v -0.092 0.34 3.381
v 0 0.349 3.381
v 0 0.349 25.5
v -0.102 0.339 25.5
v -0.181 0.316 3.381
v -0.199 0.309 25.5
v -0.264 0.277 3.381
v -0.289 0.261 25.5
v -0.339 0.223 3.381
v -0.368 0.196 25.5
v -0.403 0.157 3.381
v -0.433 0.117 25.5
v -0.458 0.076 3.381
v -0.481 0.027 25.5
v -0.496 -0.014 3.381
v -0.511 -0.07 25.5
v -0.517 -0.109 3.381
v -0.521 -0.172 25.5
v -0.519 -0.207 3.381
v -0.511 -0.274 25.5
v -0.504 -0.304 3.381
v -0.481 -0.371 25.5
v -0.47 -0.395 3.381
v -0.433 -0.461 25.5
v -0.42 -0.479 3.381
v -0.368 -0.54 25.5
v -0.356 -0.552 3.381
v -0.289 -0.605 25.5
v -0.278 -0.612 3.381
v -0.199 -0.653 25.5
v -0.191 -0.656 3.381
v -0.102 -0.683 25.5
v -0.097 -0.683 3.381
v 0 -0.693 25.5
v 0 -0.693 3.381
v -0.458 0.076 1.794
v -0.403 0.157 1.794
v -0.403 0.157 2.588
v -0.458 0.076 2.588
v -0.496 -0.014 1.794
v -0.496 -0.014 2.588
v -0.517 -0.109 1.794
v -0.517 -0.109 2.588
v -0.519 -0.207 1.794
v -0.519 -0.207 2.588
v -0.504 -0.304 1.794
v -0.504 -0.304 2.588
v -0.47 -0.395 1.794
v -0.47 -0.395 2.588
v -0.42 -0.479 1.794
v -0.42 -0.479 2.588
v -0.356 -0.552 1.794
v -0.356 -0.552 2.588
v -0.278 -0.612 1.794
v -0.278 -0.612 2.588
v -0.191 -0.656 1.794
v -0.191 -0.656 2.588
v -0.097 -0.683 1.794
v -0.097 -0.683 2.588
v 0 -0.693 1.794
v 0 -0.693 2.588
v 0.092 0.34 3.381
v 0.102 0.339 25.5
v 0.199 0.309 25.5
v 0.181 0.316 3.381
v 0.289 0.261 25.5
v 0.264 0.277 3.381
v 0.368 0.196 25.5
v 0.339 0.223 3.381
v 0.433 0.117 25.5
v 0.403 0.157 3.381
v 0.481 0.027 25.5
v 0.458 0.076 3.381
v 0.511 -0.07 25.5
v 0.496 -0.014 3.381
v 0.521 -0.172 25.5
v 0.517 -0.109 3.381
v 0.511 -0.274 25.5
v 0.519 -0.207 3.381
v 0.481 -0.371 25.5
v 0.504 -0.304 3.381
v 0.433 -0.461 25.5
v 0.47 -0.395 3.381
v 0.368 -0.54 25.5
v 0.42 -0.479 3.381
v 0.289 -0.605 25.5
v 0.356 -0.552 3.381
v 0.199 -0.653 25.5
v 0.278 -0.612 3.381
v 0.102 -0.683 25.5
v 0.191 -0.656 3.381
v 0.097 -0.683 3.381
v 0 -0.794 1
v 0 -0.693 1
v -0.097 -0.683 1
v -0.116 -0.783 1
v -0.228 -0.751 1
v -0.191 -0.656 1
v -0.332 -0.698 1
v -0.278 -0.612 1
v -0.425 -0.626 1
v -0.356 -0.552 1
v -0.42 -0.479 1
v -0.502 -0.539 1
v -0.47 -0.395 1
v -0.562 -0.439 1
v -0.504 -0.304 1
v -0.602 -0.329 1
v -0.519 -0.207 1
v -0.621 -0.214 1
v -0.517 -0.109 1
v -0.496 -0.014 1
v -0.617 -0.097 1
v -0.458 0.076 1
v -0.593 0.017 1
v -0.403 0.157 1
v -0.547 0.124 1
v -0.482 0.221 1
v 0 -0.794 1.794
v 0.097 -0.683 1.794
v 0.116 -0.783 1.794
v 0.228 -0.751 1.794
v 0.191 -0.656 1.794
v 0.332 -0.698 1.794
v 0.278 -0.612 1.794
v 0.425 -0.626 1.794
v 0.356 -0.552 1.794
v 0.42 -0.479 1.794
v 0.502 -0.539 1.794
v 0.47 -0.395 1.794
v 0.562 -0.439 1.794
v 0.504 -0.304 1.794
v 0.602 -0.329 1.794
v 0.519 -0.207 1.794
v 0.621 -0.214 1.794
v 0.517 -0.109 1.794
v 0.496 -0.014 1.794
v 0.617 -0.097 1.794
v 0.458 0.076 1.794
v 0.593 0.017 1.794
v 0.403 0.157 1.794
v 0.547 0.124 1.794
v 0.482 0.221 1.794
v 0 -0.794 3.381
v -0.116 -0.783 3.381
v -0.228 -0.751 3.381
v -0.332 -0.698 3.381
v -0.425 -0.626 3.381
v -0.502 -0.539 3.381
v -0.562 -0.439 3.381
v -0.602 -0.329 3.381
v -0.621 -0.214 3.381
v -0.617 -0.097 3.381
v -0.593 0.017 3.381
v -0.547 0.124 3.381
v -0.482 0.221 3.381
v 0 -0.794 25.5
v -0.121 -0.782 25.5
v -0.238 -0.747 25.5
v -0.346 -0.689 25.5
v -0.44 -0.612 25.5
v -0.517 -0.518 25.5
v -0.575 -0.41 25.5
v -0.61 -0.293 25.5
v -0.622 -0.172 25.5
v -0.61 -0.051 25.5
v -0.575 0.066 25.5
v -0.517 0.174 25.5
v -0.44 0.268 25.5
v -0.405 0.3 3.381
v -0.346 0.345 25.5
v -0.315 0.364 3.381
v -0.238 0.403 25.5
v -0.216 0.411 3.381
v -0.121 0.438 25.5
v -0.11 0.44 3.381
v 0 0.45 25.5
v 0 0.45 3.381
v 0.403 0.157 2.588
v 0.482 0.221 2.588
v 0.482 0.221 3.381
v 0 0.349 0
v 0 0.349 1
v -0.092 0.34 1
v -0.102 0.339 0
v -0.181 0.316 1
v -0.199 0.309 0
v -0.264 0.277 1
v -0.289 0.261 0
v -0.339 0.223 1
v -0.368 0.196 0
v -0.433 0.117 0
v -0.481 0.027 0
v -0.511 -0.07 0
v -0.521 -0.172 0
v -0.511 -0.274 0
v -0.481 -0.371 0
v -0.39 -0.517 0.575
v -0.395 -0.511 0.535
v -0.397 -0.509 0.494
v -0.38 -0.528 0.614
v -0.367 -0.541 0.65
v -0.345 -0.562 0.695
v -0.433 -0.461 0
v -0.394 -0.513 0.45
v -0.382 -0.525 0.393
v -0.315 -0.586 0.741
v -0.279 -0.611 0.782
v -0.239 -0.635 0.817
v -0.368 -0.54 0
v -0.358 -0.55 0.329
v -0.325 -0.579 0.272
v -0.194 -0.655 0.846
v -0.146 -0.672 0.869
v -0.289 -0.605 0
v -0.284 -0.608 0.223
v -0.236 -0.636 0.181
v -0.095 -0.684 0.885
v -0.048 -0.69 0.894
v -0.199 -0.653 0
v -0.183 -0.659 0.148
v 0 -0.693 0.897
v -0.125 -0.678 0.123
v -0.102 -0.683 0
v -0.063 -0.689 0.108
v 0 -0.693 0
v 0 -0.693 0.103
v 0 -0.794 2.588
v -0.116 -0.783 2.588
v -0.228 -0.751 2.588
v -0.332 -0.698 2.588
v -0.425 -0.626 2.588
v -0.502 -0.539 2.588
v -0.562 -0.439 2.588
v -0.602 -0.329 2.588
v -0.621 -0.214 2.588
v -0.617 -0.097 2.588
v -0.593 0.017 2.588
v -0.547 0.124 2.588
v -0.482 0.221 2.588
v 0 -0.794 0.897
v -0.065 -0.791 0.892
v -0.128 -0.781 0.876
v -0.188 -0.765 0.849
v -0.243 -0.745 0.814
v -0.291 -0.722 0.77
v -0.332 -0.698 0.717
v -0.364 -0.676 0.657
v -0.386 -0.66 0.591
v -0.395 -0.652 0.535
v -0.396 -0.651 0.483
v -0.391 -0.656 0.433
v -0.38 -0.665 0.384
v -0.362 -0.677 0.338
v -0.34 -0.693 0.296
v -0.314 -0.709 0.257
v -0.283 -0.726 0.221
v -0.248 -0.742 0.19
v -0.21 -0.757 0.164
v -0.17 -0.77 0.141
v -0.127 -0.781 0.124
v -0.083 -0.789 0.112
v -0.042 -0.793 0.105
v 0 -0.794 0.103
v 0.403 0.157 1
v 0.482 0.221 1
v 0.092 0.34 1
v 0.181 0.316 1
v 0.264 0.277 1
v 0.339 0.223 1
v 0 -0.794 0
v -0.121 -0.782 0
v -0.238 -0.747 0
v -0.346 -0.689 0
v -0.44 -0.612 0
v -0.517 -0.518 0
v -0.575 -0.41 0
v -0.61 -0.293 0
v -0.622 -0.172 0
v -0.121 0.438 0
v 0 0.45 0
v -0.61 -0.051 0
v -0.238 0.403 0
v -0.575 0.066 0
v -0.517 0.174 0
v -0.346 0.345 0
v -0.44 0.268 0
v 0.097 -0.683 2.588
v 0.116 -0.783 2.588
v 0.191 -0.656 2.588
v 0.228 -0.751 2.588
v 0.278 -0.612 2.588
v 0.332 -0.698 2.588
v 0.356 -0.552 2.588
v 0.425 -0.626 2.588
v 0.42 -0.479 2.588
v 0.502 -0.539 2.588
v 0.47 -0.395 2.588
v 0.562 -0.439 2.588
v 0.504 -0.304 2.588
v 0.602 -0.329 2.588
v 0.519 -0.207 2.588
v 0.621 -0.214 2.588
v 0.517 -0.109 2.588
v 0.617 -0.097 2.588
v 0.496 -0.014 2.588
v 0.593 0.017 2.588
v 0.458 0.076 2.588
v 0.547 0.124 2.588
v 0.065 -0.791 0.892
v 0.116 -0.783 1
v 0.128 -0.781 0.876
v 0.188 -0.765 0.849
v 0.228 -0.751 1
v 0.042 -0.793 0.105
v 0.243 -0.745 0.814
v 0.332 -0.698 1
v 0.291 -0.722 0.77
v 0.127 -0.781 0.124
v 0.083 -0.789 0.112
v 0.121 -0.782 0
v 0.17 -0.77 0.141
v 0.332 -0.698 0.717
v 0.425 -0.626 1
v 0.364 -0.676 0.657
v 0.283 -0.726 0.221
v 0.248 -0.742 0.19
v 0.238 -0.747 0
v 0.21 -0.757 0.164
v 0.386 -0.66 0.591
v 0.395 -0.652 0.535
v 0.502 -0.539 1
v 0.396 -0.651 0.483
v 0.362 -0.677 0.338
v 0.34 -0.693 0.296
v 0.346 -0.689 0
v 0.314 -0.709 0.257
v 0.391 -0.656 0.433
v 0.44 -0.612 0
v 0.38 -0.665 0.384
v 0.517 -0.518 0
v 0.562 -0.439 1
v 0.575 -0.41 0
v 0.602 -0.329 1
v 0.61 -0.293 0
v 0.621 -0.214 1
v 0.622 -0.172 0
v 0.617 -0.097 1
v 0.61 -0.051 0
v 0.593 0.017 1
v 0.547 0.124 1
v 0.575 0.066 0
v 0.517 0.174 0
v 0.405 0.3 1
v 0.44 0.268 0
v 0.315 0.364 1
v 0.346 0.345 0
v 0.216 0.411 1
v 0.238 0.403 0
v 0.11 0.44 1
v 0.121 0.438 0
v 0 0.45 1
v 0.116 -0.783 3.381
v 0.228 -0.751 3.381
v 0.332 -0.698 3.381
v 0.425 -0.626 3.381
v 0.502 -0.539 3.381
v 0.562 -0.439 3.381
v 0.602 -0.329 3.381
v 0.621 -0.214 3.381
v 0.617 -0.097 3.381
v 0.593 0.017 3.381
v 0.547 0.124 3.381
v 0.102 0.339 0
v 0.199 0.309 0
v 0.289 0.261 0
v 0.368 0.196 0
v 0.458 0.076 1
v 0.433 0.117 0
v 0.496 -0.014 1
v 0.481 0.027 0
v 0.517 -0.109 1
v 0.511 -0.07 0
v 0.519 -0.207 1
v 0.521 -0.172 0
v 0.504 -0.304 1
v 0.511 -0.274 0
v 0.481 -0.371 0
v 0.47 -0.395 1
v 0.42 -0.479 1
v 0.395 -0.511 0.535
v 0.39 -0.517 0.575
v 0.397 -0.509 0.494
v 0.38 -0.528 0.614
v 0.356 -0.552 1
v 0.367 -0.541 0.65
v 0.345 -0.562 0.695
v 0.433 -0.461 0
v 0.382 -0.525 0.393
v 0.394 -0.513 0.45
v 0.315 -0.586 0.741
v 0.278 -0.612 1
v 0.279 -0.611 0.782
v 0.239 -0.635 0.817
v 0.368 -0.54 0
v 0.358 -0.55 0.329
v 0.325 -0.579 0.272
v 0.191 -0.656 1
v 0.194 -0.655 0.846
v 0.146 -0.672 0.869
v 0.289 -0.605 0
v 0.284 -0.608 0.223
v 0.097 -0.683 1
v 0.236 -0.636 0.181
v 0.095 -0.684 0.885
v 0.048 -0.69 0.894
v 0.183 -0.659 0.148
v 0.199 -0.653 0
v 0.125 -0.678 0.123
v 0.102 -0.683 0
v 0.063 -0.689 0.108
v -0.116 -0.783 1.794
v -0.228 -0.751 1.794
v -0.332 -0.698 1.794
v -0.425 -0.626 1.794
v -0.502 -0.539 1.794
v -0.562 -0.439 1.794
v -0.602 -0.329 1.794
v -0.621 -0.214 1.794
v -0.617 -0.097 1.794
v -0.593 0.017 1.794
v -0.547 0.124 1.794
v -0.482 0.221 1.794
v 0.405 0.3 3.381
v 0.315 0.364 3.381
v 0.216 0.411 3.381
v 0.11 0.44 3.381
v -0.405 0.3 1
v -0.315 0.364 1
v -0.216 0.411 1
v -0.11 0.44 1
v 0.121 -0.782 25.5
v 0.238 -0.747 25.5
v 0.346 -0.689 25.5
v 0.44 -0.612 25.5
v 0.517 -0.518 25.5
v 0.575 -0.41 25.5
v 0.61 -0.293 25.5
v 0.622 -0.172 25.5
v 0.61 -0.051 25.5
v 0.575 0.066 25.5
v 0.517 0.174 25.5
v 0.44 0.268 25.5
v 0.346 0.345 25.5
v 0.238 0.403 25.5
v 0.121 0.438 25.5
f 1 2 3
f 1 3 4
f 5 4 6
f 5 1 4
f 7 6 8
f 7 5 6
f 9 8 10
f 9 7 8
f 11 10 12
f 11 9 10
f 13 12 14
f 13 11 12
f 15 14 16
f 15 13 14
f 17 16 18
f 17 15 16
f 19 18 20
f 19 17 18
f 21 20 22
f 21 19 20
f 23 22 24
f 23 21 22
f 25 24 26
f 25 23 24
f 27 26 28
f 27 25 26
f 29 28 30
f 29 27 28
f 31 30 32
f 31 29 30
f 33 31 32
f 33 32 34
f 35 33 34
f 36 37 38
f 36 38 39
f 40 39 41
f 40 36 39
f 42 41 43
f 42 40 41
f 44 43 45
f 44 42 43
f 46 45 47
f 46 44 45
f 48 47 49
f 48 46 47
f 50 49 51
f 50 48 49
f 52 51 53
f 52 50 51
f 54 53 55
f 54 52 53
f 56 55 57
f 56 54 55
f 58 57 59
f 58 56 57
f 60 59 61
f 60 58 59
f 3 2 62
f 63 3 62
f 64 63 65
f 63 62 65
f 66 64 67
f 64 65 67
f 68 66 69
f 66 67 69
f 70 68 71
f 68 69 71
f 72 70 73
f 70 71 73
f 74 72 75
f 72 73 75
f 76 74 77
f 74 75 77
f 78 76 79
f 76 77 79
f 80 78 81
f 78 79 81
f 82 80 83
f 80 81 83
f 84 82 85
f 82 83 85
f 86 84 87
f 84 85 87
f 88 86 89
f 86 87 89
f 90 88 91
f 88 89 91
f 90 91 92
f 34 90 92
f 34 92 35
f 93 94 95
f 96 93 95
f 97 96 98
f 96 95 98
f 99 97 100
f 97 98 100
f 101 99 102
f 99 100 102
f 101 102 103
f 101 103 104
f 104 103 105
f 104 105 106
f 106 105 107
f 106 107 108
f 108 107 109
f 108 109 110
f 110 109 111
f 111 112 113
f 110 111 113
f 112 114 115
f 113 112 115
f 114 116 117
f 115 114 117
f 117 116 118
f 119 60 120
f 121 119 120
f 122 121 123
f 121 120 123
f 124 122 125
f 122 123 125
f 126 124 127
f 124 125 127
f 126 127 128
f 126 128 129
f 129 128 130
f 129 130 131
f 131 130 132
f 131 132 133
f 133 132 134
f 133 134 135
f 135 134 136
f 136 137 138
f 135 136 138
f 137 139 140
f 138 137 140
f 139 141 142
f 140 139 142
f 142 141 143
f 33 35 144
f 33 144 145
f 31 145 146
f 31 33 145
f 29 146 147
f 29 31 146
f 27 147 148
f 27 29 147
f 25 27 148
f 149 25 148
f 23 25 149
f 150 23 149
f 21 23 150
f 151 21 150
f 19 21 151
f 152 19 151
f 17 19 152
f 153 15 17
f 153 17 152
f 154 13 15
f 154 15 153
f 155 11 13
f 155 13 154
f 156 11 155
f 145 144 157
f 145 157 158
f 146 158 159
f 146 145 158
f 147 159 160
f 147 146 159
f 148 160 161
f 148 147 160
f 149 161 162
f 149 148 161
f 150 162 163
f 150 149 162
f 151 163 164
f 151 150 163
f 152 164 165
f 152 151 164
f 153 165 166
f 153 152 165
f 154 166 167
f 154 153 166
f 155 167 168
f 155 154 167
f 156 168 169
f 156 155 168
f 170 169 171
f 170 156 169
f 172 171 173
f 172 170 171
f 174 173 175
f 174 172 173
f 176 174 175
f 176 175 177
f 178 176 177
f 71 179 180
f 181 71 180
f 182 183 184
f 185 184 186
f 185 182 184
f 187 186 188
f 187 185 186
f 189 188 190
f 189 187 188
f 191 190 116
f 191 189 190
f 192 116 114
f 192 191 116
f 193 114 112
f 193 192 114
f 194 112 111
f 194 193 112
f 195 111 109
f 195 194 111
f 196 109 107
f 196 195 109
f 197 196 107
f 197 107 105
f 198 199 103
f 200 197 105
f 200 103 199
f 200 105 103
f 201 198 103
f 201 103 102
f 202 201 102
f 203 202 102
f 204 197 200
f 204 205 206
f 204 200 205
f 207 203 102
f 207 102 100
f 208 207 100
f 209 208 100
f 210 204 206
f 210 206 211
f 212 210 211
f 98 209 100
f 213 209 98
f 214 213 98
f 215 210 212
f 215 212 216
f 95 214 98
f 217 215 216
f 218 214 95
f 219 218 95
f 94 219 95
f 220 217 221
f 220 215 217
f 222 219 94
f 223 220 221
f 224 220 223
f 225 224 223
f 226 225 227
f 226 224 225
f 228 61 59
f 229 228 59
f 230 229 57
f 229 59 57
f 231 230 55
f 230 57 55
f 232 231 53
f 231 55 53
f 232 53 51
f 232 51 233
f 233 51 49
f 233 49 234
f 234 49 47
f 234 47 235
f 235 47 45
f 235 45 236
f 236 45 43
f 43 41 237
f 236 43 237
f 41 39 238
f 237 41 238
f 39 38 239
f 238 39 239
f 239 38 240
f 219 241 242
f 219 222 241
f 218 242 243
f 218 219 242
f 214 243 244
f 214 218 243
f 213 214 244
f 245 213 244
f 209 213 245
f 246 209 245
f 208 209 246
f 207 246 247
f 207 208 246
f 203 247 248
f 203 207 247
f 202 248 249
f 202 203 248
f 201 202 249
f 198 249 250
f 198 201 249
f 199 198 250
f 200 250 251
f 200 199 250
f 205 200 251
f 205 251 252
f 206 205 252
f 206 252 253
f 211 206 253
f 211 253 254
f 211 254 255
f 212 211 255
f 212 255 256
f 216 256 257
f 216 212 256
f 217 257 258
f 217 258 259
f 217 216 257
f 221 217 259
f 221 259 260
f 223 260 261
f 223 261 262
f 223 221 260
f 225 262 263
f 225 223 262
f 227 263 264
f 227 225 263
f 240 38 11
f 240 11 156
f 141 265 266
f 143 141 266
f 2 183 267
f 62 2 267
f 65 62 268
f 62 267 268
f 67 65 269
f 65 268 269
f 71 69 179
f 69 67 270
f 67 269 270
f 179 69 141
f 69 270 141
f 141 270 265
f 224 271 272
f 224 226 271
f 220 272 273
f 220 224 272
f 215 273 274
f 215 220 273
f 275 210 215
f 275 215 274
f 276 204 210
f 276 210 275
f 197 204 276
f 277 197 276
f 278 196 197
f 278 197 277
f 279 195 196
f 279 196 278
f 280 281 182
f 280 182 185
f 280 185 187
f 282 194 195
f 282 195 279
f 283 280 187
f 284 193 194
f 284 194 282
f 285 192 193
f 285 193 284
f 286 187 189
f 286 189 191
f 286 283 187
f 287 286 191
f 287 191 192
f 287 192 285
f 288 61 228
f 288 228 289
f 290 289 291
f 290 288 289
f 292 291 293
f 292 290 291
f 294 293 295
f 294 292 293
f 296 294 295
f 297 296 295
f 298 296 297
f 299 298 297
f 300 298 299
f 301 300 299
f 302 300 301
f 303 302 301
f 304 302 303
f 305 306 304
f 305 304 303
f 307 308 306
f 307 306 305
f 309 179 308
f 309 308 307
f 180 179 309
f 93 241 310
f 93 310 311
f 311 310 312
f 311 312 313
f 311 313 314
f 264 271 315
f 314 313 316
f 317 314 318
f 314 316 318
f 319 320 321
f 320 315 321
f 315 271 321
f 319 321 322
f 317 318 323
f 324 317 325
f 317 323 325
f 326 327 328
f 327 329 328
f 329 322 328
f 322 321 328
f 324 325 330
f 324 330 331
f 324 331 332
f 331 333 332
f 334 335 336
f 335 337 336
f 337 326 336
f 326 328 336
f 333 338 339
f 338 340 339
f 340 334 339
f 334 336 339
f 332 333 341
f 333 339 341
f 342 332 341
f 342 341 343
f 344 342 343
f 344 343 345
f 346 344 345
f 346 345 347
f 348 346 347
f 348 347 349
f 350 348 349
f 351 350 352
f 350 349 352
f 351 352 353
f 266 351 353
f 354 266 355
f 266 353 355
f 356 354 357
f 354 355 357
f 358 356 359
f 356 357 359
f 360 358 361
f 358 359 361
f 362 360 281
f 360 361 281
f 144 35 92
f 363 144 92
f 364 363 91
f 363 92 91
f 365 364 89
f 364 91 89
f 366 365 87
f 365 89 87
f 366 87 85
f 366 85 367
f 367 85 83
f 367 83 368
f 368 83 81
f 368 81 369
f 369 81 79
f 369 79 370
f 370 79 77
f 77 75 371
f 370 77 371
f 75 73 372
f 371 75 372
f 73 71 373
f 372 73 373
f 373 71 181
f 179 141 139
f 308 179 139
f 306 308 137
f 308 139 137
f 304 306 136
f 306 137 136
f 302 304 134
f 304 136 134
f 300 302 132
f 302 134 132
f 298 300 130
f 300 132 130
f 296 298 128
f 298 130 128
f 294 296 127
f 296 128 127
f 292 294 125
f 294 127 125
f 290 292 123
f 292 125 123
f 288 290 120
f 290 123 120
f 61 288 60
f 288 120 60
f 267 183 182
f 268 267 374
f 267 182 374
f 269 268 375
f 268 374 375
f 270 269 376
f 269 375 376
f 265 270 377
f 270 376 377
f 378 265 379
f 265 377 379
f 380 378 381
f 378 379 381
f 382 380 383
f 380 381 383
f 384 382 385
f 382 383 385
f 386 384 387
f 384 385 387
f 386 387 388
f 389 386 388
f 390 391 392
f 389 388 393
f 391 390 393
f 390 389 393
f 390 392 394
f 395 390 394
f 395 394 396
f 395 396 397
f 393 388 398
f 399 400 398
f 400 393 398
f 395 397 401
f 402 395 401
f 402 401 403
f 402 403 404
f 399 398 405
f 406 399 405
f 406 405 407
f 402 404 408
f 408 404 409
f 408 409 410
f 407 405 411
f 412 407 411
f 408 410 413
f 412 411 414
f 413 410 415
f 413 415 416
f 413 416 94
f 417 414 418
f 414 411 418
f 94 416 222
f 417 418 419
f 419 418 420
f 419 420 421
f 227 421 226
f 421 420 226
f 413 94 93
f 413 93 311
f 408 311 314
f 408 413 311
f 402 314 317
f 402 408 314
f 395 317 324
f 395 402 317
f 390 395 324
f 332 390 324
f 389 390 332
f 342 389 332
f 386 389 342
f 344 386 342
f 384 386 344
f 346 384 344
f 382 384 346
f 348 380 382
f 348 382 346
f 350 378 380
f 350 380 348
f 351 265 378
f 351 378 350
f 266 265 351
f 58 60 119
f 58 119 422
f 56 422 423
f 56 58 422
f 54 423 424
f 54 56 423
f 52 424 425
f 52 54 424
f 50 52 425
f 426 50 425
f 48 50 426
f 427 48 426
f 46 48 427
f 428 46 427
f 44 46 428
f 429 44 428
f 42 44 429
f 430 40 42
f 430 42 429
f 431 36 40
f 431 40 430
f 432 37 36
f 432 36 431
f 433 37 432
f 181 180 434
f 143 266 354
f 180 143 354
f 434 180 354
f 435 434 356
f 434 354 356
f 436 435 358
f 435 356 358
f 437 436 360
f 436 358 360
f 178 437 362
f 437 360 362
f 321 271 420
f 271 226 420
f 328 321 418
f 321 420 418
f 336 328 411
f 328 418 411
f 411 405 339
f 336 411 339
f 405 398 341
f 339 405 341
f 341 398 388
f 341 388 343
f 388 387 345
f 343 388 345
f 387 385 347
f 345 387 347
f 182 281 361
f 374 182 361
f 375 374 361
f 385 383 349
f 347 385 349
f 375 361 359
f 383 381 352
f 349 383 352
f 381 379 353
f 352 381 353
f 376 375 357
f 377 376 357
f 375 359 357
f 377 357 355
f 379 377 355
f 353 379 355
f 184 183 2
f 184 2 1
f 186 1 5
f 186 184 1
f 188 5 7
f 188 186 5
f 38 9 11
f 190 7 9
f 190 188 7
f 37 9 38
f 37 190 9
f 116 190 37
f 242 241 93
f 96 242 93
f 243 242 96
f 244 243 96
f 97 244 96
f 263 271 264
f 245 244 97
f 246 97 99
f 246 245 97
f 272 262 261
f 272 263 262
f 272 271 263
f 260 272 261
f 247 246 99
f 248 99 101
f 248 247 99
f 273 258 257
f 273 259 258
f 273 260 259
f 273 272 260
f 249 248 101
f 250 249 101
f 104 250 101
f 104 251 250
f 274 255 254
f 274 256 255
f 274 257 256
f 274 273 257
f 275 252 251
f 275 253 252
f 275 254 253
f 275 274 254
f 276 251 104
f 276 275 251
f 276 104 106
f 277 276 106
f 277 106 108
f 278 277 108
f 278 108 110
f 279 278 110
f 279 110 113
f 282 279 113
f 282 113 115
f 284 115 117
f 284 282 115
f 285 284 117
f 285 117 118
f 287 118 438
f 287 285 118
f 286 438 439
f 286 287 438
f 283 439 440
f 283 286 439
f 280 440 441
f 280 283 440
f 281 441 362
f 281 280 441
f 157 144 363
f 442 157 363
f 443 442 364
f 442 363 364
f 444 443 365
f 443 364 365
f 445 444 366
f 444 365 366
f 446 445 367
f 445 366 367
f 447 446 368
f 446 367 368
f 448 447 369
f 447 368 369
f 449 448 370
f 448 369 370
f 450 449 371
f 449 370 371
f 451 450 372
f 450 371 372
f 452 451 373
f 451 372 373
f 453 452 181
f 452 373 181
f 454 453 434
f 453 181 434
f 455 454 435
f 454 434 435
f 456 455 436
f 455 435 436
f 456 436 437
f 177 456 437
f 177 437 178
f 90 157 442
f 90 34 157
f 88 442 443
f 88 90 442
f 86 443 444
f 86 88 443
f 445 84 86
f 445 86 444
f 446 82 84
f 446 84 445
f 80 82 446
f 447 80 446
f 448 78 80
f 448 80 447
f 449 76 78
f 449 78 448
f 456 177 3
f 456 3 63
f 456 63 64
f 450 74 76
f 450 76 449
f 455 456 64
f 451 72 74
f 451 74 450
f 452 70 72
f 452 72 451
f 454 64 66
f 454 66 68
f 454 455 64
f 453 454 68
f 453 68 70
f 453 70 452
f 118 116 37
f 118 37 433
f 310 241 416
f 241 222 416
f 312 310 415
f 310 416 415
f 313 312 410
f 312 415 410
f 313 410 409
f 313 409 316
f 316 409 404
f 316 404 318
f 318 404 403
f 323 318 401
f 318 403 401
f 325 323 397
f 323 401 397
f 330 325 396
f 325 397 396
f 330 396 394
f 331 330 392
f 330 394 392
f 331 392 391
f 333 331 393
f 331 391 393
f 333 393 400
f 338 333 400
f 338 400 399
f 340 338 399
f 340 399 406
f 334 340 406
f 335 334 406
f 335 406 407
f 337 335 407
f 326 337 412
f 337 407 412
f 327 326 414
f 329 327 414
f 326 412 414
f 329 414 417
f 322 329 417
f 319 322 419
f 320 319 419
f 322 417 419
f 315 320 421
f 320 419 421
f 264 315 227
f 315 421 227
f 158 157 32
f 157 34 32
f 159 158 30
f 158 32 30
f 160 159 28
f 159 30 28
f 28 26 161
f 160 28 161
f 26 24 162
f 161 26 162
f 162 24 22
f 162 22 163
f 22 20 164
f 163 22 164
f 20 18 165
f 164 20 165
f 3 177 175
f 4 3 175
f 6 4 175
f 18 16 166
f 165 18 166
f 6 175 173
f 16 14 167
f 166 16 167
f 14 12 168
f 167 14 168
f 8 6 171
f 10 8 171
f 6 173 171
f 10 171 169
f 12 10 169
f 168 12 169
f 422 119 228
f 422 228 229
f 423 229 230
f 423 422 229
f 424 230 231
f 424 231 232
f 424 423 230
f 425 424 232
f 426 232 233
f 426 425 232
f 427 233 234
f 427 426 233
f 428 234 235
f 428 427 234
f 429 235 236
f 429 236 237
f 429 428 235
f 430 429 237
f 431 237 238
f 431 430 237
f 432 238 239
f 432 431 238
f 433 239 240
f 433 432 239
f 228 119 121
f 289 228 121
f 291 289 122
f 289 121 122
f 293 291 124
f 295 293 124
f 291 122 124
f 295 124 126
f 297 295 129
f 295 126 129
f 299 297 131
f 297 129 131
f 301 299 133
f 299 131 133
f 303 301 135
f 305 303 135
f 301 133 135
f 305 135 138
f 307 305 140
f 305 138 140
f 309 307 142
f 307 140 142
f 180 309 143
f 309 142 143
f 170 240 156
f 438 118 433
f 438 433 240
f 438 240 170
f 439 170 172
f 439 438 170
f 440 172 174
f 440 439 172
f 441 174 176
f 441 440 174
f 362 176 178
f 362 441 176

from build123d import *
from build123d.topology import SkipClean

# Parameters (mm, degrees)
THICKEN1_START     = 3.38125
THICKEN1_DEPTH     = 22.11875
THICKEN1_2_DEPTH   = 1
THICKEN1_START_2   = 1.79375
THICKEN1_3_DEPTH   = 0.79375
THICKEN1_START_3   = 1
THICKEN1_4_DEPTH   = 2.38125
SKETCH7_R          = 0.396875
CUT_EXTRUDE1_DEPTH = 10


with BuildPart() as part:
    # Thicken1: read off the stored shape, not the designer's step
    # Thicken1 outline → Thicken1 (new body)
    with BuildSketch(Plane.XY.offset(THICKEN1_START)):
        with BuildLine():
            ThreePointArc((0, -0.794033341), (0.622, -0.172033341), (0, 0.449966659))
            Line((0, 0.449966659), (0, 0.348580659))
            ThreePointArc((0, 0.348580659), (0.520614, -0.172033341), (0, -0.692647341))
            Line((0, -0.692647341), (0, -0.794033341))
        make_face()
    extrude(amount=THICKEN1_DEPTH)



with BuildPart() as body_2:
    # Thicken1 2 outline → Thicken1 2 (new body)
    with BuildSketch(Plane.XY):
        with BuildLine():
            ThreePointArc((0, -0.794033341), (0.622, -0.172033341), (0, 0.449966659))
            Line((0, 0.449966659), (0, 0.348580659))
            ThreePointArc((0, 0.348580659), (0.520614, -0.172033341), (0, -0.692647341))
            Line((0, -0.692647341), (0, -0.794033341))
        make_face()
    extrude(amount=THICKEN1_2_DEPTH)


with BuildPart() as body_3:
    # Thicken1 3 outline → Thicken1 3 (new body)
    with BuildSketch(Plane.XY.offset(THICKEN1_START_2)):
        with BuildLine():
            ThreePointArc((0, -0.794033341), (0.622, -0.172033341), (0, 0.449966659))
            Line((0, 0.449966659), (0, 0.348580659))
            ThreePointArc((0, 0.348580659), (0.520614, -0.172033341), (0, -0.692647341))
            Line((0, -0.692647341), (0, -0.794033341))
        make_face()
    extrude(amount=THICKEN1_3_DEPTH)


with BuildPart() as part_1:
    add(part.part)

    add(body_2.part)  # Thicken1 4 merges body 2

    add(body_3.part)  # Thicken1 4 merges body 3
    # Thicken1 4 outline → Thicken1 4 (add)
    with BuildSketch(Plane.XY.offset(THICKEN1_START_3)):
        with BuildLine():
            Line((0.40339385, 0.157075059), (0.481952031, 0.221166659))
            ThreePointArc((0.481952031, 0.221166659), (0.26675232, 0.389862735), (0, 0.449966659))
            Line((0, 0.449966659), (0, 0.348580659))
            ThreePointArc((0, 0.348580659), (0.223271692, 0.298273674), (0.40339385, 0.157075059))
        make_face()
    extrude(amount=THICKEN1_4_DEPTH)

    # Sketch7 → Cut-Extrude1 (cut)
    with BuildSketch(Plane(origin=(0, 0, 0), x_dir=(1, 0, 0), z_dir=(0, 1, 0))):
        with Locations((0, -0.5)):
            Circle(SKETCH7_R)
    extrude(amount=-CUT_EXTRUDE1_DEPTH, mode=Mode.SUBTRACT)

    # Mirror2: part across face


with BuildPart() as part_2:
    with SkipClean():  # the faces are left unmerged after this step: merging them gives an invalid solid
        add(part_1.part)
        add(part_1.part.mirror(Plane(origin=(0, 0.399273659, 12.75), x_dir=(0, 0, 1), z_dir=(-1, 0, 0))))


solid = part_2.part
